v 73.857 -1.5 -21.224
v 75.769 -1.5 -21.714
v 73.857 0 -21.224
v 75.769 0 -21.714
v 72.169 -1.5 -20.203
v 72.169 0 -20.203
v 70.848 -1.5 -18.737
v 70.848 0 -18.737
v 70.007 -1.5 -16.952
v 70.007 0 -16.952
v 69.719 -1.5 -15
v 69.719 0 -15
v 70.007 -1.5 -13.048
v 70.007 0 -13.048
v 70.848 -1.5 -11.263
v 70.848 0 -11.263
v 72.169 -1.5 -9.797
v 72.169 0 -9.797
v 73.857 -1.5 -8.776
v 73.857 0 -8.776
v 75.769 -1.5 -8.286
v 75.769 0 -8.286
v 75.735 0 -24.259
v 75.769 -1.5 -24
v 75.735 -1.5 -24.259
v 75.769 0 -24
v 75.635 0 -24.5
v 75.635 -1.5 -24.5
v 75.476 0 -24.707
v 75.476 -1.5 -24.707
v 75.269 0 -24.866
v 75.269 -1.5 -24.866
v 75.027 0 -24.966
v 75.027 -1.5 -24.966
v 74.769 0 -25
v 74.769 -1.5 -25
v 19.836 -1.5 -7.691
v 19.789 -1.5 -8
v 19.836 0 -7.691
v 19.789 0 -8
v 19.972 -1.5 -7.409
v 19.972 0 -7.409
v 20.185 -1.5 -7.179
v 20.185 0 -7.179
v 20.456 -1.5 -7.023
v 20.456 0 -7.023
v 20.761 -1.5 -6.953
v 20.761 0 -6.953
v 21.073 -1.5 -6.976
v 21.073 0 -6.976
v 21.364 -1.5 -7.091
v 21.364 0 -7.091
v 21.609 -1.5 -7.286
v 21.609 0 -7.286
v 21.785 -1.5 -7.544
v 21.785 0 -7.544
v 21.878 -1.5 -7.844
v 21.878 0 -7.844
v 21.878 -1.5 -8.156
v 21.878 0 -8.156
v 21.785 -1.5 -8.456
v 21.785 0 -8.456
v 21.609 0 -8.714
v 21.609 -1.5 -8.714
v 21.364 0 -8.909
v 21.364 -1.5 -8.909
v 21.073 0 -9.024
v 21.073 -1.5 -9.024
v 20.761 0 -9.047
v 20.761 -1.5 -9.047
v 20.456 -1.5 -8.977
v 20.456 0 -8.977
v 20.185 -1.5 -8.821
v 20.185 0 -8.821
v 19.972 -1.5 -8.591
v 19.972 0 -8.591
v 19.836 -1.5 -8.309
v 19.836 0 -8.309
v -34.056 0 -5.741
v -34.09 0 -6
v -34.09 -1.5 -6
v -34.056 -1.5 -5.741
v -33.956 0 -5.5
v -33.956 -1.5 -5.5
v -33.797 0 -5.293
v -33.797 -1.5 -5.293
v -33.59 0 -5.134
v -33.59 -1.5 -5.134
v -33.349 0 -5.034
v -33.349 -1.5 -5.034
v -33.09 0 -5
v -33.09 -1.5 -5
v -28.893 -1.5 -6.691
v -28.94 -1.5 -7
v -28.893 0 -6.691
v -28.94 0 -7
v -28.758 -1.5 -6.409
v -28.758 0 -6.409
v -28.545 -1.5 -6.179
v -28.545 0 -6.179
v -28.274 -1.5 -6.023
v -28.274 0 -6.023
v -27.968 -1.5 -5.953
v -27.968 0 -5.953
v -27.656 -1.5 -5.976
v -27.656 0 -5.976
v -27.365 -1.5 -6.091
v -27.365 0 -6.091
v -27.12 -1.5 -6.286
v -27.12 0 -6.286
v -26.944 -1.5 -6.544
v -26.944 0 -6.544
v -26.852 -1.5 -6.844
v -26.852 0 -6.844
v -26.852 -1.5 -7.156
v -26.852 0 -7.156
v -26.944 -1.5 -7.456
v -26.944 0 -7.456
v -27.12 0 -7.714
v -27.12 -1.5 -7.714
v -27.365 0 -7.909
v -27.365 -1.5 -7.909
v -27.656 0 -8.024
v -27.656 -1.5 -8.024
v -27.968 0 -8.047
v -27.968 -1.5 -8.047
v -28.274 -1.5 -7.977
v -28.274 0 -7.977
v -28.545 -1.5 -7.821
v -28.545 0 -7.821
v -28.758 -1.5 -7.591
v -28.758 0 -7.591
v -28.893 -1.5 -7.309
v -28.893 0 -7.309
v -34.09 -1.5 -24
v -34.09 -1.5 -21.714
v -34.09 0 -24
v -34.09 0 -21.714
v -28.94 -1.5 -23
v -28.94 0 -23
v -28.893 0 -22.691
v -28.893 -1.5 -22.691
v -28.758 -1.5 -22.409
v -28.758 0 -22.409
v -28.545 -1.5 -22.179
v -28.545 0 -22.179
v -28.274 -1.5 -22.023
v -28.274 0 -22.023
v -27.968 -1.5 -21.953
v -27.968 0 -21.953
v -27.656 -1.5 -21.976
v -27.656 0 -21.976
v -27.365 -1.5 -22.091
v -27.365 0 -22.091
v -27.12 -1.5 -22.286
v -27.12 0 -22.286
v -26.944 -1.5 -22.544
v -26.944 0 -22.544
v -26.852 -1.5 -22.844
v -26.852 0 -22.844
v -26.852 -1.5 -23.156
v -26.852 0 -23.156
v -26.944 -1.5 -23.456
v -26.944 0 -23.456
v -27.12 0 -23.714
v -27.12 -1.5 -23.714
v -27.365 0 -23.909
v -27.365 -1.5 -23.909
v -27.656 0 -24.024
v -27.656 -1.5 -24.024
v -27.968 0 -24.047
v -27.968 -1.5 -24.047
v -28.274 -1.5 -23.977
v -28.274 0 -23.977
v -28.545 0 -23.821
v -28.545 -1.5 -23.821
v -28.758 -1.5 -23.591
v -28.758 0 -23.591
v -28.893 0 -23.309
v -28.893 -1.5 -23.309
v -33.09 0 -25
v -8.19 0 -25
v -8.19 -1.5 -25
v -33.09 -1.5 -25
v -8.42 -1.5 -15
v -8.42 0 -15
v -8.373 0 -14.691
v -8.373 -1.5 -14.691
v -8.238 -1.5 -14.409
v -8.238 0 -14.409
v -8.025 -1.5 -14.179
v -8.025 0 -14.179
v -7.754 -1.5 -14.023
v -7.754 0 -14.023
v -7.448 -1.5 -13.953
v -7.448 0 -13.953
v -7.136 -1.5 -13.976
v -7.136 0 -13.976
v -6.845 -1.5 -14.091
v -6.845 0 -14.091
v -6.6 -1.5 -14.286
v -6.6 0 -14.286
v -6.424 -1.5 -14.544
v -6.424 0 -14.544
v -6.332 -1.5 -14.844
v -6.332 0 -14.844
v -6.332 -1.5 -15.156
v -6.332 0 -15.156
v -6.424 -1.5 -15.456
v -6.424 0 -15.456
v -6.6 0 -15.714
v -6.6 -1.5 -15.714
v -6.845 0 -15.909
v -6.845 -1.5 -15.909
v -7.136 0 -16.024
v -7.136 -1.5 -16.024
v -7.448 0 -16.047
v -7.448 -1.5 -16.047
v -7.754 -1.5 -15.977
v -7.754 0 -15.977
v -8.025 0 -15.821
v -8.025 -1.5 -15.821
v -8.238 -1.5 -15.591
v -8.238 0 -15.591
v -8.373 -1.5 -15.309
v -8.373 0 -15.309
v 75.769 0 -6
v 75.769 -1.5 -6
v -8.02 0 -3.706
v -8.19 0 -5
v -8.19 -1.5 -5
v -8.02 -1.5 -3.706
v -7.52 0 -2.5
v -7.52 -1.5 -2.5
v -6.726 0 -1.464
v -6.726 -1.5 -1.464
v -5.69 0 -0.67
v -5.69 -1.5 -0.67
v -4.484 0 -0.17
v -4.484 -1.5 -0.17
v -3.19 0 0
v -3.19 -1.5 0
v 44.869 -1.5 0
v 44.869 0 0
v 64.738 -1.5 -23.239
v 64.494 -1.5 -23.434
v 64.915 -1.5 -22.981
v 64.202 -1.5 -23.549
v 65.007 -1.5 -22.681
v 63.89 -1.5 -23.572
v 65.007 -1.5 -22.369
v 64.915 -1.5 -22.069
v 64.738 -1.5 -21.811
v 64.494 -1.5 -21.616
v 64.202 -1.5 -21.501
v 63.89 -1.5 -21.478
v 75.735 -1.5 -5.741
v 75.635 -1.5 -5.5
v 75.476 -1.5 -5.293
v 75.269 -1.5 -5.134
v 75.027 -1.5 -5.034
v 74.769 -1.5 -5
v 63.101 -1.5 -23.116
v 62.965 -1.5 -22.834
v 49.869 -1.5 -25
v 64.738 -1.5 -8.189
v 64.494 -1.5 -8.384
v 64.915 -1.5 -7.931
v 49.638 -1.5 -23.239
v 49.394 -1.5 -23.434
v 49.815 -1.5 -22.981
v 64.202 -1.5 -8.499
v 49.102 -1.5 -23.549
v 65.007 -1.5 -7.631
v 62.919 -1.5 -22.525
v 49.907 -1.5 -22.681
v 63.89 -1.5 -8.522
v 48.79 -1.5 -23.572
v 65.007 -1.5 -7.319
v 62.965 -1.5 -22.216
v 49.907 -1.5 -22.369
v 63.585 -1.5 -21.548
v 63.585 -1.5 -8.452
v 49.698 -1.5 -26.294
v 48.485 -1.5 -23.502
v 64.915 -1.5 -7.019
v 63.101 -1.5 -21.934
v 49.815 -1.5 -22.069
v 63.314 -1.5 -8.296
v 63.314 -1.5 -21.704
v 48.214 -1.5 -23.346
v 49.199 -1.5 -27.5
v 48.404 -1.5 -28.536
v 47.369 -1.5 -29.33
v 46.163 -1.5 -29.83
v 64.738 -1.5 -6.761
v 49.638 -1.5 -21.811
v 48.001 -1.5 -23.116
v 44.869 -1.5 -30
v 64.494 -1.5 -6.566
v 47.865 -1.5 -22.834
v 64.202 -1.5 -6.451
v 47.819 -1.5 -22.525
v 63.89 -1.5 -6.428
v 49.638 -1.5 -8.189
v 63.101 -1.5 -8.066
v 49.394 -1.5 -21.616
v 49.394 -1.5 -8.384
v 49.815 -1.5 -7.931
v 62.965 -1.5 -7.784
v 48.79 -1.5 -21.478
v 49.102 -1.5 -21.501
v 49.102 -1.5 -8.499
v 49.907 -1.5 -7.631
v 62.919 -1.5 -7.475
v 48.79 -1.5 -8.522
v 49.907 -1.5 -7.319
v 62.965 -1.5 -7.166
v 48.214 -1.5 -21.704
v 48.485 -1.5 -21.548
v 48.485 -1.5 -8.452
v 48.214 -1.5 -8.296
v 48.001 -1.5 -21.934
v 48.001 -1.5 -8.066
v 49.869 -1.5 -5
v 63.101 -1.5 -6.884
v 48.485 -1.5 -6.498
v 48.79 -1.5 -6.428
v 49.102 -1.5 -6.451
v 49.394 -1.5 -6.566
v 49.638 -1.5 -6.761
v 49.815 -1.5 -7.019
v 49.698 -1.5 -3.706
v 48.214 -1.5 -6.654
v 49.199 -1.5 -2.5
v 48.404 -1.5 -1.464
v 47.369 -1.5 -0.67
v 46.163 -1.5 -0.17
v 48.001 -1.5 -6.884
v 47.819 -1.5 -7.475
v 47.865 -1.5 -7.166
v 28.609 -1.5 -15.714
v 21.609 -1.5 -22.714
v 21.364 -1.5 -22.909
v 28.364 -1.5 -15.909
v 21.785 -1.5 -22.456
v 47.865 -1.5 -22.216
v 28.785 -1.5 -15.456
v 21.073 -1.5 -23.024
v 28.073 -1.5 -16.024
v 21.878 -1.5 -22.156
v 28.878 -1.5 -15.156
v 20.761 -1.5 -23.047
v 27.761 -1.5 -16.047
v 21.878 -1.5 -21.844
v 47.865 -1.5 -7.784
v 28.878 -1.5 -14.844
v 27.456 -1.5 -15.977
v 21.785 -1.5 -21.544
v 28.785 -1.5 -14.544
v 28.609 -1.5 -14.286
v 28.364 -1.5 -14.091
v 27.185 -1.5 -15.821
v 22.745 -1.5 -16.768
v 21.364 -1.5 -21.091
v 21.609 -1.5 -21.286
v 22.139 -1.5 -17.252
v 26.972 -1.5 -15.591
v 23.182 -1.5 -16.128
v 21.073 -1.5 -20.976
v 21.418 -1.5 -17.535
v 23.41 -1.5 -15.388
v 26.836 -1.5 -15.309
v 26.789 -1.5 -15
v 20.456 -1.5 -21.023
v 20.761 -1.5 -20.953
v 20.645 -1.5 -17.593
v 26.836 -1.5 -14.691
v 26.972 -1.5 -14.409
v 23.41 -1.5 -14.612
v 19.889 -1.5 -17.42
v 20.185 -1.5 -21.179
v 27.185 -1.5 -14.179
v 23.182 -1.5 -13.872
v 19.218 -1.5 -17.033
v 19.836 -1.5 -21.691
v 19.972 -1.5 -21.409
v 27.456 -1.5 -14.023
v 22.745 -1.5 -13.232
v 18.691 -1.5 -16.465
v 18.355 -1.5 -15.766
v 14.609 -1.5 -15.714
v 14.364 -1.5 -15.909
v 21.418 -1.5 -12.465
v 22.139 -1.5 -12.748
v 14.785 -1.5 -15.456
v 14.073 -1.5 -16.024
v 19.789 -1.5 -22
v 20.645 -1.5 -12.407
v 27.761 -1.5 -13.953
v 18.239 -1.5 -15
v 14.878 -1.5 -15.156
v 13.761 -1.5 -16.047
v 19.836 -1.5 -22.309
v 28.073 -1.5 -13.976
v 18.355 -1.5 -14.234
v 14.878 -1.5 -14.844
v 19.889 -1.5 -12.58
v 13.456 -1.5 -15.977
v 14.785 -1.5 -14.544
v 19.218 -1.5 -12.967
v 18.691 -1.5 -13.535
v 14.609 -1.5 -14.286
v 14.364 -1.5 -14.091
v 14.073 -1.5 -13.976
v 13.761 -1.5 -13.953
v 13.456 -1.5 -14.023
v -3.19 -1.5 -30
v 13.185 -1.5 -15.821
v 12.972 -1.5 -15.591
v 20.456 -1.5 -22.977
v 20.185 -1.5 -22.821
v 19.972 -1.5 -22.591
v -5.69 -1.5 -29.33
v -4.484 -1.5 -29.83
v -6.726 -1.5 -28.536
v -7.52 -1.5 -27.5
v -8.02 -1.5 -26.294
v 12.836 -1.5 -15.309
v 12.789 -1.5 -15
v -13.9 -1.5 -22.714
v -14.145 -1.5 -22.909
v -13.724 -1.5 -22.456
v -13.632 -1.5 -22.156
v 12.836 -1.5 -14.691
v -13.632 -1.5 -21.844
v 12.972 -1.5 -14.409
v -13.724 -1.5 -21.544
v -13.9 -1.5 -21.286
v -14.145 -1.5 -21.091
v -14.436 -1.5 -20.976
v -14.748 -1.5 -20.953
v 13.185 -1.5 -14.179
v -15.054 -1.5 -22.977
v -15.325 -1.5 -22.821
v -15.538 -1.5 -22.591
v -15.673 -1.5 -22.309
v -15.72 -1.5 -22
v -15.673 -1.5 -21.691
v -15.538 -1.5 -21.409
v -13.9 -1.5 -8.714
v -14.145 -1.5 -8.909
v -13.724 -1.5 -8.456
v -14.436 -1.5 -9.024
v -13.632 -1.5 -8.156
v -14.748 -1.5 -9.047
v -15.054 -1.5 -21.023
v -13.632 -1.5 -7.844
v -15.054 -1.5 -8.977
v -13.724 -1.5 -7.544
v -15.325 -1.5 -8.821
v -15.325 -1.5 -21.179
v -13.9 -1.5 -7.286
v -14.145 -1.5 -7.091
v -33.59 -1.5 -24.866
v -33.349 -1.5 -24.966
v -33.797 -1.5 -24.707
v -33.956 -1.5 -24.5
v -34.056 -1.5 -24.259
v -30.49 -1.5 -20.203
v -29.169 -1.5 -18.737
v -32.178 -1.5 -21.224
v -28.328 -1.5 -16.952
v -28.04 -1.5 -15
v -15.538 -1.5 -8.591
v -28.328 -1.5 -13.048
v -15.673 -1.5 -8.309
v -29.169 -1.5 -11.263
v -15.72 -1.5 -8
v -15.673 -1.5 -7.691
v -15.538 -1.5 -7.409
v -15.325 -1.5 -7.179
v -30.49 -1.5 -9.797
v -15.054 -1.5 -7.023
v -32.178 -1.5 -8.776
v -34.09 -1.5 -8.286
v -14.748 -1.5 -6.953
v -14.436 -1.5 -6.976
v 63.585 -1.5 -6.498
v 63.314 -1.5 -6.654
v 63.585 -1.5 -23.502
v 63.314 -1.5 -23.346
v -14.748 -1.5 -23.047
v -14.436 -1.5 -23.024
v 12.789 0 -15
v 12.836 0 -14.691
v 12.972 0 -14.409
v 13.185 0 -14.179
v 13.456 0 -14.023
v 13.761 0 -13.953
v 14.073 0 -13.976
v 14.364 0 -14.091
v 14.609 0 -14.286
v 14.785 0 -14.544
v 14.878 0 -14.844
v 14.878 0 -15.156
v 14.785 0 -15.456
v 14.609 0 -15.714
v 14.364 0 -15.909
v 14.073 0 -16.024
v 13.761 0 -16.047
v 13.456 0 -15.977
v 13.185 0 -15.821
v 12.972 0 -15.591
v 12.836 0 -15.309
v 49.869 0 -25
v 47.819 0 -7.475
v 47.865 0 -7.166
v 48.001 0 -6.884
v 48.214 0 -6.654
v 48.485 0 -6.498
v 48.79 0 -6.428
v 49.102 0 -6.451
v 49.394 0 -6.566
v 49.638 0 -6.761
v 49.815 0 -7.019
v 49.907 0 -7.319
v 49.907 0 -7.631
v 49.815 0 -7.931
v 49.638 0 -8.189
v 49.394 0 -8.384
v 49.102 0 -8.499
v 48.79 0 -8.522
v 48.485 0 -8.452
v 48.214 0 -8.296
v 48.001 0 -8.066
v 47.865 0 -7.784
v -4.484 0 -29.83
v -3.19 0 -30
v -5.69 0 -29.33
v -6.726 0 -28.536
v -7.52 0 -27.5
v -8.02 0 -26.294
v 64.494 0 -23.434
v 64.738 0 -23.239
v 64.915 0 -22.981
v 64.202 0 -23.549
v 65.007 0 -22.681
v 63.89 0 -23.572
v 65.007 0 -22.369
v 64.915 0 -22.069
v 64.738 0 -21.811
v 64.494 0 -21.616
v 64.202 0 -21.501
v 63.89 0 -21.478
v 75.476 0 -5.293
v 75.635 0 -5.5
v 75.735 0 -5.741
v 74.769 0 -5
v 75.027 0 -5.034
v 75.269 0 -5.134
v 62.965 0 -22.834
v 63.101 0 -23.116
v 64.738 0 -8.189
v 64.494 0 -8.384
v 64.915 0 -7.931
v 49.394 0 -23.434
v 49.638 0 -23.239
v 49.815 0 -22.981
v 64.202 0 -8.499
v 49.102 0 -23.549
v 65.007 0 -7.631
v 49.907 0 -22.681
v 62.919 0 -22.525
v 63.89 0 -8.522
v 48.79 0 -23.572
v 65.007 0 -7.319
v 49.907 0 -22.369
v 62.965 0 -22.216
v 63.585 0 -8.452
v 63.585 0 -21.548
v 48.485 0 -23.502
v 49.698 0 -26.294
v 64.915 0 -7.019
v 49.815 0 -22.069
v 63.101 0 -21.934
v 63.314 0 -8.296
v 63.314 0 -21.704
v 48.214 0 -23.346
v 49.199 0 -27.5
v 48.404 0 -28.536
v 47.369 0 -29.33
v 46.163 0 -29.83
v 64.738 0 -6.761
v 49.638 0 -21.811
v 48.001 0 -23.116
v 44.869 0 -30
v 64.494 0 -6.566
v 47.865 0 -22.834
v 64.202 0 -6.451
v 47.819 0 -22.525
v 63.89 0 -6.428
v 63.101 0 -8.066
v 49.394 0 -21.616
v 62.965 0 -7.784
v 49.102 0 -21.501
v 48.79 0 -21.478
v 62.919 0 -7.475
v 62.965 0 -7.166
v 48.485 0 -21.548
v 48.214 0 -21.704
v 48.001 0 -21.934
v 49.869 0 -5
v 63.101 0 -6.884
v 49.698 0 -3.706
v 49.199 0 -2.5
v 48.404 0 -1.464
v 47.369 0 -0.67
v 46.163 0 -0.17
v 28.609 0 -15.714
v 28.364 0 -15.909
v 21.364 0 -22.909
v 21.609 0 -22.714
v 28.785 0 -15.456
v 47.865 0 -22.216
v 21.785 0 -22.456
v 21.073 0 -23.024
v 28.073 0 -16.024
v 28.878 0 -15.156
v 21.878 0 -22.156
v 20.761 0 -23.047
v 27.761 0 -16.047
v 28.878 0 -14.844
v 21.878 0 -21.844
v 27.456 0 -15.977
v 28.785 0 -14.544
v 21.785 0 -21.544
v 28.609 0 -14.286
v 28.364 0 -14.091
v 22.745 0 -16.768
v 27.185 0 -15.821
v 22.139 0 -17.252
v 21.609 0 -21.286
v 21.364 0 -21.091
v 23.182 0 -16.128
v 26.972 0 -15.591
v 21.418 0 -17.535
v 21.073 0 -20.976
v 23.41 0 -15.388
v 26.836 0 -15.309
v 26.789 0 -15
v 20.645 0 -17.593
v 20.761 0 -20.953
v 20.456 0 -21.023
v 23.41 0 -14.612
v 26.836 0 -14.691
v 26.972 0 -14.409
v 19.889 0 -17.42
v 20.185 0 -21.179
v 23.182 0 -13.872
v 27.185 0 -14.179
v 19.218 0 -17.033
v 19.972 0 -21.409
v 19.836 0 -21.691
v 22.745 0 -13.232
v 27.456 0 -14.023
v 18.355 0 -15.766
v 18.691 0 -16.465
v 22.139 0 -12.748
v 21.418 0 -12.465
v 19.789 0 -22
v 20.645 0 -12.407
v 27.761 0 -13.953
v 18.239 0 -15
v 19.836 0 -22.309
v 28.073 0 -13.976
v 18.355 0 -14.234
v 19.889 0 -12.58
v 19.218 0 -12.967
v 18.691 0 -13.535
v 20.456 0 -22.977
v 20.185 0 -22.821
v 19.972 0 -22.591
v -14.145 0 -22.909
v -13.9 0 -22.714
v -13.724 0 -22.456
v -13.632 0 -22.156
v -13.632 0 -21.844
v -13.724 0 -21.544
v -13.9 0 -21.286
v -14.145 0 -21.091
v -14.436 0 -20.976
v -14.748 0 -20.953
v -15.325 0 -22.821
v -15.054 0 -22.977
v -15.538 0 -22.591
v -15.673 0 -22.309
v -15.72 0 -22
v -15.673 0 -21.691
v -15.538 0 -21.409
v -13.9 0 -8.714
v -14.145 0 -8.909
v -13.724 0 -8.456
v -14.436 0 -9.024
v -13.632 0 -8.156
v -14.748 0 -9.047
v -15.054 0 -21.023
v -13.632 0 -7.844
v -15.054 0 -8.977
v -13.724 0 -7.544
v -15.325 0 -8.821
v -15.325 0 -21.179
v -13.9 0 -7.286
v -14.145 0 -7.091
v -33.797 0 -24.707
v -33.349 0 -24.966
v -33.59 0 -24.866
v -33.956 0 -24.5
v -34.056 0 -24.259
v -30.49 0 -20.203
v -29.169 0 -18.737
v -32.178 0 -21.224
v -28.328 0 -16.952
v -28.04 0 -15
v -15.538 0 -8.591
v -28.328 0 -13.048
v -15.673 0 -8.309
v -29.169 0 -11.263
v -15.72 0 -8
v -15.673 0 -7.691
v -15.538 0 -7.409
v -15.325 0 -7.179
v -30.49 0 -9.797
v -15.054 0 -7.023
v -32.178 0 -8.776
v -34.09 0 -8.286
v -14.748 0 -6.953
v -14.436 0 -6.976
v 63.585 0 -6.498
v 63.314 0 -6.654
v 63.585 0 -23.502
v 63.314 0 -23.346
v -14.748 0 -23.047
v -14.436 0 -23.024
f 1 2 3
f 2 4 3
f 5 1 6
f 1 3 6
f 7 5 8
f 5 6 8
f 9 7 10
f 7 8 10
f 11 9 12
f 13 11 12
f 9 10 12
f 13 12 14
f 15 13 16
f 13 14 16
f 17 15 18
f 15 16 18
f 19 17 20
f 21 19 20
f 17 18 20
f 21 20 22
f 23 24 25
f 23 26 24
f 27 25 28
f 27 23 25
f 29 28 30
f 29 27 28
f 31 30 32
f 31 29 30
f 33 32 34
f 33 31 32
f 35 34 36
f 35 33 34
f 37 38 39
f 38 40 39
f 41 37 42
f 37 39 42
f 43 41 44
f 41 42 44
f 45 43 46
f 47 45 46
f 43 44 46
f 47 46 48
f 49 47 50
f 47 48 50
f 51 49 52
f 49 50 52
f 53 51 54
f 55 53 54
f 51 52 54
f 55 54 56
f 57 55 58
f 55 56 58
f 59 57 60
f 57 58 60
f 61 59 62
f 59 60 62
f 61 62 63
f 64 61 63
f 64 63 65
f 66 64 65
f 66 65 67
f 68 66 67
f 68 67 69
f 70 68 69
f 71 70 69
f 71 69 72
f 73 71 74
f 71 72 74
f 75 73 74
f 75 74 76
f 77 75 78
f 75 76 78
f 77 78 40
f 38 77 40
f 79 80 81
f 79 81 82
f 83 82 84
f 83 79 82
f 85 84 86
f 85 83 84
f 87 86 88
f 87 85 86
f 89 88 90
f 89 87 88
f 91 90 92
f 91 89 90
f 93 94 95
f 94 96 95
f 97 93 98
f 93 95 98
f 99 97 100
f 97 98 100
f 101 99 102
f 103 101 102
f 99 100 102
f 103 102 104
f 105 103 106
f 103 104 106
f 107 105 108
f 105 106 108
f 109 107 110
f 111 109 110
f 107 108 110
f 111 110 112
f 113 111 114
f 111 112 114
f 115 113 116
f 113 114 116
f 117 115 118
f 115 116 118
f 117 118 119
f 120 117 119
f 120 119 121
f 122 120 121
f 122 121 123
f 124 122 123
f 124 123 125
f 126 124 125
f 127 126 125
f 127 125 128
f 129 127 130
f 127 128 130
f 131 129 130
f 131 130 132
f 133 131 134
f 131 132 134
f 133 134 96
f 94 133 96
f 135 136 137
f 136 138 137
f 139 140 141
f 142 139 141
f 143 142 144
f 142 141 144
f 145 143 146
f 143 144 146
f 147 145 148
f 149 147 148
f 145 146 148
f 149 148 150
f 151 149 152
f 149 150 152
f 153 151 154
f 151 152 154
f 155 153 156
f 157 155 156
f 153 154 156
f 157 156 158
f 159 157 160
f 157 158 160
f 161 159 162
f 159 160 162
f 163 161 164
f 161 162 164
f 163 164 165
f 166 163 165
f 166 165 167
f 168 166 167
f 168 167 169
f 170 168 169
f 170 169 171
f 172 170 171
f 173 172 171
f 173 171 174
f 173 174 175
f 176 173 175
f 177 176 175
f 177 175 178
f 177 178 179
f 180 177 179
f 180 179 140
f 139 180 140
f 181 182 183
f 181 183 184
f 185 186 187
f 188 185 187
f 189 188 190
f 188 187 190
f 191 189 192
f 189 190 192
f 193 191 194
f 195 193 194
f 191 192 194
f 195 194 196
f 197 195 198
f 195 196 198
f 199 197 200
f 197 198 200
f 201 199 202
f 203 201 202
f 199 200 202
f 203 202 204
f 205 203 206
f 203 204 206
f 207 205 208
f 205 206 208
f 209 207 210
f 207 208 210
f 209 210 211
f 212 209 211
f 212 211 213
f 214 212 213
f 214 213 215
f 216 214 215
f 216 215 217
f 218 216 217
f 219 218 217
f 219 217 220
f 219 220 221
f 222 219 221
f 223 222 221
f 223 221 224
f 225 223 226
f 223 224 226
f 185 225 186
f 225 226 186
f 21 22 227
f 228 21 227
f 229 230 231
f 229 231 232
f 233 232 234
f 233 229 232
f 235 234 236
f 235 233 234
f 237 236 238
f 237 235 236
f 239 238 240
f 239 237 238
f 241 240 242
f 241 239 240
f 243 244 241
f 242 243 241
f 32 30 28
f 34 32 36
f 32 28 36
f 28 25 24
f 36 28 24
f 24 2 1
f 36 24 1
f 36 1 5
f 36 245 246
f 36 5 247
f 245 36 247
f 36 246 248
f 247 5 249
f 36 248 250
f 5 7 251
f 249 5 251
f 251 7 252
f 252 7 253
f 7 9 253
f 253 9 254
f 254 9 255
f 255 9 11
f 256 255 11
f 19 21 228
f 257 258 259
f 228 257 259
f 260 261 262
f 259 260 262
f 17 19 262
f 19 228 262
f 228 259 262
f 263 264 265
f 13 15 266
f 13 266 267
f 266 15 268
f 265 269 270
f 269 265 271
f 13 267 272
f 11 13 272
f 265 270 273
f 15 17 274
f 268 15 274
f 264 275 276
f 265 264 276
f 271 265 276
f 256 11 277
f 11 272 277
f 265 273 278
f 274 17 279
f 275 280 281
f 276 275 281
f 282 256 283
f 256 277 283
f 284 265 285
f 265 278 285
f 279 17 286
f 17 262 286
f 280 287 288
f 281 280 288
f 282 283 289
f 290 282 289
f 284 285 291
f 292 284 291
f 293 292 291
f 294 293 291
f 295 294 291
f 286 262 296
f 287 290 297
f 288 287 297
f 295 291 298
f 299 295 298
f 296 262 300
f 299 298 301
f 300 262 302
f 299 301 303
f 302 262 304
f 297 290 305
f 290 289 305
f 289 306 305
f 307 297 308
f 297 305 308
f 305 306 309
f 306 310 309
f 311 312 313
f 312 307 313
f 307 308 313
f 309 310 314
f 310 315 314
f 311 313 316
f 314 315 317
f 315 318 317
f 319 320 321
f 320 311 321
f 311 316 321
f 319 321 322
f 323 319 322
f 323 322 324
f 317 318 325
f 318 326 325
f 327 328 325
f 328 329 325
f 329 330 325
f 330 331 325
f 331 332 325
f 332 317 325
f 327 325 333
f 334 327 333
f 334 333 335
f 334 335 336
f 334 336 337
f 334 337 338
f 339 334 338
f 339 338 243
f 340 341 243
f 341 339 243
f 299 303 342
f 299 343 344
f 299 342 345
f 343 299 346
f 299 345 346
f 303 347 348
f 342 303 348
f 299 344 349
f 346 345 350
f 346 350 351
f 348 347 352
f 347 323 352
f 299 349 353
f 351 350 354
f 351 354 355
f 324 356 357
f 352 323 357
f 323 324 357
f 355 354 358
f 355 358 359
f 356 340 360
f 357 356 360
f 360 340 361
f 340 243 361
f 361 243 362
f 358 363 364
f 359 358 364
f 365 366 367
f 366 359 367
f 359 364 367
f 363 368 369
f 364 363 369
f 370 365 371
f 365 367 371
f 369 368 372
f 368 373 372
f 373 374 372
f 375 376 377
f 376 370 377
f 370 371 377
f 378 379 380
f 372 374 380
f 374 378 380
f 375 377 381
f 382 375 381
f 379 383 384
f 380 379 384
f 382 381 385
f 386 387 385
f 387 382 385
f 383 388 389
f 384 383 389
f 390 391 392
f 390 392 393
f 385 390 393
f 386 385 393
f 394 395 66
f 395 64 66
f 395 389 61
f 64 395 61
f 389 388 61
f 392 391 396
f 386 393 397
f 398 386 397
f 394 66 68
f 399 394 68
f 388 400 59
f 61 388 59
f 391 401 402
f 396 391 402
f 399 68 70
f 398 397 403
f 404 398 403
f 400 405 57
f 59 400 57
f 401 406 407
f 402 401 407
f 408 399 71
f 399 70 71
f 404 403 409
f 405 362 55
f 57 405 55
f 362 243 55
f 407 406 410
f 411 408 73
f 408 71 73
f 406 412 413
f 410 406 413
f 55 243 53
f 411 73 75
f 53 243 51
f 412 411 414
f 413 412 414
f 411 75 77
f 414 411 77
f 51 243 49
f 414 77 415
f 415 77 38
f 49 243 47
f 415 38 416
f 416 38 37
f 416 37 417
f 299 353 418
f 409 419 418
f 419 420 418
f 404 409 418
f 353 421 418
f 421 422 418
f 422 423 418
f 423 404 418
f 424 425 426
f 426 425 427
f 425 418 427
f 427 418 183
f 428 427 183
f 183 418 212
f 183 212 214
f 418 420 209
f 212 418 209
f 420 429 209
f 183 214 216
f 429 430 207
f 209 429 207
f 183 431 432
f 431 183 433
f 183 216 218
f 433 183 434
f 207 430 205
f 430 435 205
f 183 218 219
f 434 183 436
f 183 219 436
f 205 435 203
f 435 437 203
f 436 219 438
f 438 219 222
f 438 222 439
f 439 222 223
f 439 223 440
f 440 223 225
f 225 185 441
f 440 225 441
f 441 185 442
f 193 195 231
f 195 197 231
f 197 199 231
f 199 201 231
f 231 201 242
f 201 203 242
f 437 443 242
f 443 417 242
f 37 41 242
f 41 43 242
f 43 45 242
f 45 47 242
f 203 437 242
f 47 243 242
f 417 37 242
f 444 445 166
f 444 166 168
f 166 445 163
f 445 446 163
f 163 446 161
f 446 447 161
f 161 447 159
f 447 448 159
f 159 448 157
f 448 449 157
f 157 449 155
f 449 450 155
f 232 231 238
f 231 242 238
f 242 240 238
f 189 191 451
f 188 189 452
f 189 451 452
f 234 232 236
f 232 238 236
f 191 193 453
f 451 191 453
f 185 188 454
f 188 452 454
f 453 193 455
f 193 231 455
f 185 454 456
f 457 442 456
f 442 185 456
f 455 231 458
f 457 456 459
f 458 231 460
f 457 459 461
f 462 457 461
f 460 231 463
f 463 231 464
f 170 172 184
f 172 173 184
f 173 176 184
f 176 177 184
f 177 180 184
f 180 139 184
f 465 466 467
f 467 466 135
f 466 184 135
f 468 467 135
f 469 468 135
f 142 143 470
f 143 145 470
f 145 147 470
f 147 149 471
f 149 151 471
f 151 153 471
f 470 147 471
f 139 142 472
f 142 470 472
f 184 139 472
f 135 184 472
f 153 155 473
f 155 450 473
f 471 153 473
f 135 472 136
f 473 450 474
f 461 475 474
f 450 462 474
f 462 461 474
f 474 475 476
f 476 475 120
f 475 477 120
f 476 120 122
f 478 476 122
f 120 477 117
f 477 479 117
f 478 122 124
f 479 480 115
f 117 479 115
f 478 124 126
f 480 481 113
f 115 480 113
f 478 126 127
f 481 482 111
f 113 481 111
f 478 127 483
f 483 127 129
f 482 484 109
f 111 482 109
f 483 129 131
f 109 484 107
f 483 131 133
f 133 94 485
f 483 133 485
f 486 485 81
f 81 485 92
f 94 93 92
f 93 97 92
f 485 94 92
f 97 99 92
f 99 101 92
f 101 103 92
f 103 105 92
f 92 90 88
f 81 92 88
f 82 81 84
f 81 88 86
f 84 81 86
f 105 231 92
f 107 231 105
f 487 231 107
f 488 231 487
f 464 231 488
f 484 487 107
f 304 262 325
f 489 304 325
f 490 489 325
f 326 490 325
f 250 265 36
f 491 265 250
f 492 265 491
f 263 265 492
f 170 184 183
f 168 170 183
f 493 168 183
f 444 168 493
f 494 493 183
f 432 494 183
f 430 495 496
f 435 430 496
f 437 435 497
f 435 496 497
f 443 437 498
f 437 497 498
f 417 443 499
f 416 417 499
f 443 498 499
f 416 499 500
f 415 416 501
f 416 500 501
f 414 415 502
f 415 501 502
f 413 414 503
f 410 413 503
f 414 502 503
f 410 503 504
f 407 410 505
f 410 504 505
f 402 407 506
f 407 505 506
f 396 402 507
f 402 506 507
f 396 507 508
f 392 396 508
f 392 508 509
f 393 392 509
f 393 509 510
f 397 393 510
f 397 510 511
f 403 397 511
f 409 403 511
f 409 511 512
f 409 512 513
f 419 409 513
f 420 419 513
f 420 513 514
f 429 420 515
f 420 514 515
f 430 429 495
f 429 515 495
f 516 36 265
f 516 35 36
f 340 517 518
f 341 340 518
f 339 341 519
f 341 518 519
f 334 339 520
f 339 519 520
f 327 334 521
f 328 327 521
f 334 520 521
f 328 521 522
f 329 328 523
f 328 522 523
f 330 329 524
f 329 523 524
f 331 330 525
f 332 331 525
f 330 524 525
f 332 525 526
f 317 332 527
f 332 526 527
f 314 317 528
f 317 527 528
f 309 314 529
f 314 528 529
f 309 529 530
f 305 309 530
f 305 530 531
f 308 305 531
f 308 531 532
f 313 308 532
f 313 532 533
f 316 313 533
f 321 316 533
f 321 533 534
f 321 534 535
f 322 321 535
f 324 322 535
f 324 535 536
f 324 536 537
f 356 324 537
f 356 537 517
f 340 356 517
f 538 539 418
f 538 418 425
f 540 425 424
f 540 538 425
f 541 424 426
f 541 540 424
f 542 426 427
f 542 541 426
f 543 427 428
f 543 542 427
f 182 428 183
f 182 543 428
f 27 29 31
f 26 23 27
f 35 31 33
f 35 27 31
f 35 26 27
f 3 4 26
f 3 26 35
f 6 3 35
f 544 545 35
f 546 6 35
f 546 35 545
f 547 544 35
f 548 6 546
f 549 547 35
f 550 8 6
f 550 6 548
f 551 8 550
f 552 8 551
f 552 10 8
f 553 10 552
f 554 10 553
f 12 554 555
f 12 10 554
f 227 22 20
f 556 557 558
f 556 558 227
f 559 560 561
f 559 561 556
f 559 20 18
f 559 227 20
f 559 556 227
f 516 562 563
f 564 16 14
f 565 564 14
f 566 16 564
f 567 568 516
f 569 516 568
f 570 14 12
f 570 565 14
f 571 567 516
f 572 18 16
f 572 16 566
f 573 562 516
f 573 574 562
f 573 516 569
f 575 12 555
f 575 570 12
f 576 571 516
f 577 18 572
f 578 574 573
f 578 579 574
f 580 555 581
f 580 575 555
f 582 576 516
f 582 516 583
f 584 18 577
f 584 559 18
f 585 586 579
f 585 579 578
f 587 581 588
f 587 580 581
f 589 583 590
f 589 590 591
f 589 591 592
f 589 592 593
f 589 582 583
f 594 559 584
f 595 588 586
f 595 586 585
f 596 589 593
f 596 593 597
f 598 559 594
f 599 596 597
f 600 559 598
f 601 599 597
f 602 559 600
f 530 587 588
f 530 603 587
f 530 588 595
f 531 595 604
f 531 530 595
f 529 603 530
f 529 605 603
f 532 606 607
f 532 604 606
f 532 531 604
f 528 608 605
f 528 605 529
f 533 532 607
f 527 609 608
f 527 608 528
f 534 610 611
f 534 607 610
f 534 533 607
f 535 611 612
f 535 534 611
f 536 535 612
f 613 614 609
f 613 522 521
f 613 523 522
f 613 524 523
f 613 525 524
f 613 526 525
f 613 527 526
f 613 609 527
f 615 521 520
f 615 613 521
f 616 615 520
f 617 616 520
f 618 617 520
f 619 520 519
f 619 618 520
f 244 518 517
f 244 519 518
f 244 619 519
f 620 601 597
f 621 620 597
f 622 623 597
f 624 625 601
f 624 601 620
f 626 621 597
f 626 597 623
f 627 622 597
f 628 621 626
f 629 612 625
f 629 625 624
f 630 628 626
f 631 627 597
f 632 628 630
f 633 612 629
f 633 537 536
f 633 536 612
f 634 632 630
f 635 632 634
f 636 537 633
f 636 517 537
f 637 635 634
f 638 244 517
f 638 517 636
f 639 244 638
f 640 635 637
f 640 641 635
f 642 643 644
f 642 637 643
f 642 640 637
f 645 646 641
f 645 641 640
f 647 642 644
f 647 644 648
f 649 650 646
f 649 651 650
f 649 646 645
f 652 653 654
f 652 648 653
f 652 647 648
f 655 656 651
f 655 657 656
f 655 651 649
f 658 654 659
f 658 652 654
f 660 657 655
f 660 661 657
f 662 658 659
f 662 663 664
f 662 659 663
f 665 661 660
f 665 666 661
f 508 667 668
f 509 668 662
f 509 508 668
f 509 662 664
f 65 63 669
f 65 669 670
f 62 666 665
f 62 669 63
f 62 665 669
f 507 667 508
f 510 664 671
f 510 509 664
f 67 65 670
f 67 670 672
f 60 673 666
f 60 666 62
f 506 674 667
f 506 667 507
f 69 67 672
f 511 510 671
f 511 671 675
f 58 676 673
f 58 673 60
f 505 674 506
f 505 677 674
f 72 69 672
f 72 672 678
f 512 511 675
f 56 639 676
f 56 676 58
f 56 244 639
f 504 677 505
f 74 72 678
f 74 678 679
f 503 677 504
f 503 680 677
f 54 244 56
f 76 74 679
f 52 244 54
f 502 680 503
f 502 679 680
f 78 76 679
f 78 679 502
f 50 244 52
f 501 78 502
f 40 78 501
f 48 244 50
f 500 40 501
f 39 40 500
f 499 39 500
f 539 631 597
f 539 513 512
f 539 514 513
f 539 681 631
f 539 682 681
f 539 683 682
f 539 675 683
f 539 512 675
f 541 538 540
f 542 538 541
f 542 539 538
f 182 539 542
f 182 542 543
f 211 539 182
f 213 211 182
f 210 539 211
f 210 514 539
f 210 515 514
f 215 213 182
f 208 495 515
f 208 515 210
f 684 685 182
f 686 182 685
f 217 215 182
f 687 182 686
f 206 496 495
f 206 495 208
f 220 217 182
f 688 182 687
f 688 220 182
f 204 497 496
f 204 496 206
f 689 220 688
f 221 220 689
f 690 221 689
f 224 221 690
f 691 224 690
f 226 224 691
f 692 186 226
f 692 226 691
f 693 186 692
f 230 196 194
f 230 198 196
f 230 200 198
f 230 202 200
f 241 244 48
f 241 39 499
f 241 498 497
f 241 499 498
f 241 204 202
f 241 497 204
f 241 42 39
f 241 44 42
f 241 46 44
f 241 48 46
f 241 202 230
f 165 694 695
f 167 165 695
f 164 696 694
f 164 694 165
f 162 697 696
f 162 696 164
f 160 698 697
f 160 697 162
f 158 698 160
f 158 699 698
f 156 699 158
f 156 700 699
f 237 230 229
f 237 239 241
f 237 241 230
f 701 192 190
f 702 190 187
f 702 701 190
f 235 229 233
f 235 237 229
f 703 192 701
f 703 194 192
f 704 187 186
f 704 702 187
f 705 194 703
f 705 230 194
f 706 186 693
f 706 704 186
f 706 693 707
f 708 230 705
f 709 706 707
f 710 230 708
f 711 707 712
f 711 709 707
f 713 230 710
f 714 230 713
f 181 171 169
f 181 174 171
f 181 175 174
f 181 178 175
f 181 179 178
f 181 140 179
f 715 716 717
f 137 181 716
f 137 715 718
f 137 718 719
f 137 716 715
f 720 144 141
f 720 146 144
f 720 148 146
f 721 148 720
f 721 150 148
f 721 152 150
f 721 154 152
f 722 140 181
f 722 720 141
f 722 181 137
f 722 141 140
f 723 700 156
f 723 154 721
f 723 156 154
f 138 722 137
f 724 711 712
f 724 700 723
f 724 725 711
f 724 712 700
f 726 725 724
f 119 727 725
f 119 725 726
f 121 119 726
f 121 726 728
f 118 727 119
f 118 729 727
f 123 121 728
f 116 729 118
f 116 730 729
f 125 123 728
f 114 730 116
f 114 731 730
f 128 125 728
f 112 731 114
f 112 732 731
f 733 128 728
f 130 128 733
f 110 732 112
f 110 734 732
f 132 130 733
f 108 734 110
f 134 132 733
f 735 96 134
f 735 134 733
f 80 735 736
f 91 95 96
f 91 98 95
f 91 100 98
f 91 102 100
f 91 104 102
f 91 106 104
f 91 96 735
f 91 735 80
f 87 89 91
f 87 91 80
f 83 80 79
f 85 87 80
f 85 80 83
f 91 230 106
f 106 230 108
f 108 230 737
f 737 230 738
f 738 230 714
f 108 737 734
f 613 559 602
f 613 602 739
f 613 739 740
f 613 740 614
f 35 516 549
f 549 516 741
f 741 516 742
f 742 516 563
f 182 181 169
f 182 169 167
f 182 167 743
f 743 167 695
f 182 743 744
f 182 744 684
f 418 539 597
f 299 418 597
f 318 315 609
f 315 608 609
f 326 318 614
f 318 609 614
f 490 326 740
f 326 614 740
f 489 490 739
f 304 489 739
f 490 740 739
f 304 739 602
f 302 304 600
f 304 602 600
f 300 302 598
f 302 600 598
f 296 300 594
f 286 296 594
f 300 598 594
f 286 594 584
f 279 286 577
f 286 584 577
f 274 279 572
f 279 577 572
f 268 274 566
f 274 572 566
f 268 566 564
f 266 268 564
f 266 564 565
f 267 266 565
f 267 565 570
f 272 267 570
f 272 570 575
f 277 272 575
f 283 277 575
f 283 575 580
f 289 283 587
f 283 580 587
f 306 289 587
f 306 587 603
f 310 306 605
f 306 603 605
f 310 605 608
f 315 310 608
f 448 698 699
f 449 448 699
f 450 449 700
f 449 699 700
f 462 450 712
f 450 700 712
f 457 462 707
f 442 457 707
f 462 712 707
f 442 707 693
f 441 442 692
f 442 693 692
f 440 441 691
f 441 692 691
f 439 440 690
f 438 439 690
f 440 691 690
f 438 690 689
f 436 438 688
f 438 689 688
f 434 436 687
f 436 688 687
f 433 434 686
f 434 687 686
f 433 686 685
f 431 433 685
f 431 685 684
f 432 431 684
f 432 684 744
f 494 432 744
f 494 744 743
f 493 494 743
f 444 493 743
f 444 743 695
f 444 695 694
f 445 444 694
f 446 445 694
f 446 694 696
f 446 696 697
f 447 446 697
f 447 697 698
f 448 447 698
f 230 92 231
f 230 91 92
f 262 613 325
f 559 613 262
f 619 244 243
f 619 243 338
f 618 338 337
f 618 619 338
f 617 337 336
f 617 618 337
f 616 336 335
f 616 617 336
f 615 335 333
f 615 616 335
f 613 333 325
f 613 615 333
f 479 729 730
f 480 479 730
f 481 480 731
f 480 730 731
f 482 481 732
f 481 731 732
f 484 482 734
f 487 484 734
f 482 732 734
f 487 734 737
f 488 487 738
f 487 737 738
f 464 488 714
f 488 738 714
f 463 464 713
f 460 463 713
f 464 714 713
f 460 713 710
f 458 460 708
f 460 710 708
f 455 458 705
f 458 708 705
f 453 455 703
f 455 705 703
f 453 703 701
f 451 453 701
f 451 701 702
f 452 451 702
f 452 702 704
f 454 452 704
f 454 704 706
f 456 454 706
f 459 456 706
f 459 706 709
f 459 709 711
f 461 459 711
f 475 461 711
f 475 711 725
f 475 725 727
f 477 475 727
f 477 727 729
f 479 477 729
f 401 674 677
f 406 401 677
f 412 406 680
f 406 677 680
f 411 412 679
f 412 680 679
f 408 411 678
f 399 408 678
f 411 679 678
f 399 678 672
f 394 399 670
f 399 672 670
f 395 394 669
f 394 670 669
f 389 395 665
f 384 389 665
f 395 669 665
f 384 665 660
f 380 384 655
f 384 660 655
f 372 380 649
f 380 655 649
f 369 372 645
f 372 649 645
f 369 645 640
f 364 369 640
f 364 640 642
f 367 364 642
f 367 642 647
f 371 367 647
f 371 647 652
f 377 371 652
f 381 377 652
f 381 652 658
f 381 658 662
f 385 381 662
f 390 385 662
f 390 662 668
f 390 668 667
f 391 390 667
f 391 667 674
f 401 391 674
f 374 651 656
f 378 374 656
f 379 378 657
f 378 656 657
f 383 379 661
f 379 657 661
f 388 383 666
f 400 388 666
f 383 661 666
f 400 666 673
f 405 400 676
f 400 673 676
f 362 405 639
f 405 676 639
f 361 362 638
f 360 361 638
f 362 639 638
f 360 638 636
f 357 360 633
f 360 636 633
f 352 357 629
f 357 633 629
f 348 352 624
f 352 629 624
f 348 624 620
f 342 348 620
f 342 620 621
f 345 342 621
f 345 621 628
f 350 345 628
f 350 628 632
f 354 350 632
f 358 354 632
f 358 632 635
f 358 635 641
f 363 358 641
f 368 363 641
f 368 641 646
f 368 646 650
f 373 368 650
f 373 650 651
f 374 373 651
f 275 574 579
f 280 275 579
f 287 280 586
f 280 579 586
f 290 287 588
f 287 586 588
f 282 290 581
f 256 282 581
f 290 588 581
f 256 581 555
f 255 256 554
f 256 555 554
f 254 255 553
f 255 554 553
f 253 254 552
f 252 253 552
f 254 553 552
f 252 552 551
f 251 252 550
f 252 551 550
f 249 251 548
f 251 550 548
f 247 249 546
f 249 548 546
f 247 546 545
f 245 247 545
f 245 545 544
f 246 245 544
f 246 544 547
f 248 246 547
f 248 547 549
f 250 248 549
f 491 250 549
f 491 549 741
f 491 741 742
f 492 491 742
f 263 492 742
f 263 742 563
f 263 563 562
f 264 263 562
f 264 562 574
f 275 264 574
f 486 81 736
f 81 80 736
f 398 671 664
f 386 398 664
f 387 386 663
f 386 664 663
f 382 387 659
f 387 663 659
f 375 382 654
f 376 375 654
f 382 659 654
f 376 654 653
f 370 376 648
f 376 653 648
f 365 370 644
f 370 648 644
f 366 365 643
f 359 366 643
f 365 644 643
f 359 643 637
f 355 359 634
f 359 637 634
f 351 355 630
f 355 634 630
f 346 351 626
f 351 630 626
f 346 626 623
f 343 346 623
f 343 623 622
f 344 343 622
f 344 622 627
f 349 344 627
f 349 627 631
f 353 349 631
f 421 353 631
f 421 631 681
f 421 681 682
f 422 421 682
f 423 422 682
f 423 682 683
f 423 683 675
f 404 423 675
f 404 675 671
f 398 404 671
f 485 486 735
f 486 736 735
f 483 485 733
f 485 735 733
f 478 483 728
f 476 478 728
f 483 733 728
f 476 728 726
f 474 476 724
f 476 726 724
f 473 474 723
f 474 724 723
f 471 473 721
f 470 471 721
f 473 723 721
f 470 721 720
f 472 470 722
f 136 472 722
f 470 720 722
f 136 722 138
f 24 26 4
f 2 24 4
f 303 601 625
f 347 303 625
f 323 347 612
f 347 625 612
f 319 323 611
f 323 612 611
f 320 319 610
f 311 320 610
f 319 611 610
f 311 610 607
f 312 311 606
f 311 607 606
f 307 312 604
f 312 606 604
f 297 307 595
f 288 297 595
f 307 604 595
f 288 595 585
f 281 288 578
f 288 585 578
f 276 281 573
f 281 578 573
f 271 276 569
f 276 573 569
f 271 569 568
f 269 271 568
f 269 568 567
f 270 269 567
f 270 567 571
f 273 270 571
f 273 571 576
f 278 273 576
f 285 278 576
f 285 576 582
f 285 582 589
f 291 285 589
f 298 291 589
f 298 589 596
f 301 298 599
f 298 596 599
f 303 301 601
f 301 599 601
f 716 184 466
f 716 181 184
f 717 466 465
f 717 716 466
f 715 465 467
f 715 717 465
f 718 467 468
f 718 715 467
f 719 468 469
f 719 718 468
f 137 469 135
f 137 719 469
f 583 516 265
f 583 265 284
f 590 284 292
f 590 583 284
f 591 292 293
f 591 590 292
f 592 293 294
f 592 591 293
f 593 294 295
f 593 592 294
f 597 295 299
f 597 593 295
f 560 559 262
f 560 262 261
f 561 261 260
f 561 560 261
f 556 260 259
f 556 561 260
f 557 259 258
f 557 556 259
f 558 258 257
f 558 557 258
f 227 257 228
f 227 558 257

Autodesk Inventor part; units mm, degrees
ref_plane "YZ Plane" through (0, 0, 0) normal (1, 0, 0) x (0, 1, 0)
ref_plane "XZ Plane" through (0, 0, 0) normal (0, 1, 0) x (-1, 0, 0)
ref_plane "XY Plane" through (0, 0, 0) normal (0, 0, 1) x (1, 0, 0)
sketch "Sketch1" plane through (0, 0, 0) normal (0, 1, 0) x (-1, 0, 0)
  line L0 (-0.4496, -30) -> (-0.4496, 0)
  line L1 (-41.2289, 0) -> (-41.2289, -30)
  circle A0 centre (-48.8686, -22.525) radius 1.05
  circle A1 centre (-48.8686, -7.475) radius 1.05
  circle A2 centre (-63.9686, -22.525) radius 1.05
  circle A3 centre (-63.9686, -7.475) radius 1.05
  circle A4 centre (27.89, -23) radius 1.05
  circle A5 centre (27.89, -7) radius 1.05
  circle A6 centre (14.67, -22) radius 1.05
  circle A7 centre (14.67, -8) radius 1.05
  circle A8 centre (7.37, -15) radius 1.05
  circle A9 centre (-20.8393, -15) radius 2.6
  circle A10 centre (-27.8393, -15) radius 1.05
  circle A11 centre (-20.8393, -8) radius 1.05
  circle A12 centre (-20.8393, -22) radius 1.05
  circle A13 centre (-13.8393, -15) radius 1.05
  arc A14 (-75.7686, -21.7136) -> (-75.7686, -8.2864) centre (-76.4686, -15) ccw
  line L2 (-75.7686, -24) -> (-75.7686, -21.7136)
  arc A15 (-75.7686, -24) -> (-74.7686, -25) centre (-74.7686, -24) ccw
  line L3 (-74.7686, -25) -> (-49.8686, -25)
  arc A16 (-49.8686, -25) -> (-44.8686, -30) centre (-44.8686, -25) ccw
  line L4 (3.19, -30) -> (-44.8686, -30)
  arc A17 (3.19, -30) -> (8.19, -25) centre (3.19, -25) ccw
  line L5 (8.19, -25) -> (33.09, -25)
  arc A18 (33.09, -25) -> (34.09, -24) centre (33.09, -24) ccw
  line L6 (34.09, -21.7136) -> (34.09, -24)
  arc A19 (34.09, -8.2864) -> (34.09, -21.7136) centre (34.79, -15) ccw
  line L7 (34.09, -6) -> (34.09, -8.2864)
  arc A20 (34.09, -6) -> (33.09, -5) centre (33.09, -6) ccw
  line L8 (33.09, -5) -> (8.19, -5)
  arc A21 (8.19, -5) -> (3.19, 0) centre (3.19, -5) ccw
  line L9 (-44.8686, 0) -> (3.19, 0)
  arc A22 (-44.8686, 0) -> (-49.8686, -5) centre (-44.8686, -5) ccw
  line L10 (-49.8686, -5) -> (-74.7686, -5)
  arc A23 (-74.7686, -5) -> (-75.7686, -6) centre (-74.7686, -6) ccw
  line L11 (-75.7686, -8.2864) -> (-75.7686, -6)
  line L12 (-41.6786, -30) -> (-41.6786, 0)
  line L13 (-40.7793, 0) -> (-40.7793, -30)
  line L14 (-0.8993, -30) -> (-0.8993, 0)
  line L15 (0, 0) -> (0, -30)
extrude "Extrusion1" add sketch "Sketch1" against normal blind 1.5
properties part number "axis_13_top_frame"
